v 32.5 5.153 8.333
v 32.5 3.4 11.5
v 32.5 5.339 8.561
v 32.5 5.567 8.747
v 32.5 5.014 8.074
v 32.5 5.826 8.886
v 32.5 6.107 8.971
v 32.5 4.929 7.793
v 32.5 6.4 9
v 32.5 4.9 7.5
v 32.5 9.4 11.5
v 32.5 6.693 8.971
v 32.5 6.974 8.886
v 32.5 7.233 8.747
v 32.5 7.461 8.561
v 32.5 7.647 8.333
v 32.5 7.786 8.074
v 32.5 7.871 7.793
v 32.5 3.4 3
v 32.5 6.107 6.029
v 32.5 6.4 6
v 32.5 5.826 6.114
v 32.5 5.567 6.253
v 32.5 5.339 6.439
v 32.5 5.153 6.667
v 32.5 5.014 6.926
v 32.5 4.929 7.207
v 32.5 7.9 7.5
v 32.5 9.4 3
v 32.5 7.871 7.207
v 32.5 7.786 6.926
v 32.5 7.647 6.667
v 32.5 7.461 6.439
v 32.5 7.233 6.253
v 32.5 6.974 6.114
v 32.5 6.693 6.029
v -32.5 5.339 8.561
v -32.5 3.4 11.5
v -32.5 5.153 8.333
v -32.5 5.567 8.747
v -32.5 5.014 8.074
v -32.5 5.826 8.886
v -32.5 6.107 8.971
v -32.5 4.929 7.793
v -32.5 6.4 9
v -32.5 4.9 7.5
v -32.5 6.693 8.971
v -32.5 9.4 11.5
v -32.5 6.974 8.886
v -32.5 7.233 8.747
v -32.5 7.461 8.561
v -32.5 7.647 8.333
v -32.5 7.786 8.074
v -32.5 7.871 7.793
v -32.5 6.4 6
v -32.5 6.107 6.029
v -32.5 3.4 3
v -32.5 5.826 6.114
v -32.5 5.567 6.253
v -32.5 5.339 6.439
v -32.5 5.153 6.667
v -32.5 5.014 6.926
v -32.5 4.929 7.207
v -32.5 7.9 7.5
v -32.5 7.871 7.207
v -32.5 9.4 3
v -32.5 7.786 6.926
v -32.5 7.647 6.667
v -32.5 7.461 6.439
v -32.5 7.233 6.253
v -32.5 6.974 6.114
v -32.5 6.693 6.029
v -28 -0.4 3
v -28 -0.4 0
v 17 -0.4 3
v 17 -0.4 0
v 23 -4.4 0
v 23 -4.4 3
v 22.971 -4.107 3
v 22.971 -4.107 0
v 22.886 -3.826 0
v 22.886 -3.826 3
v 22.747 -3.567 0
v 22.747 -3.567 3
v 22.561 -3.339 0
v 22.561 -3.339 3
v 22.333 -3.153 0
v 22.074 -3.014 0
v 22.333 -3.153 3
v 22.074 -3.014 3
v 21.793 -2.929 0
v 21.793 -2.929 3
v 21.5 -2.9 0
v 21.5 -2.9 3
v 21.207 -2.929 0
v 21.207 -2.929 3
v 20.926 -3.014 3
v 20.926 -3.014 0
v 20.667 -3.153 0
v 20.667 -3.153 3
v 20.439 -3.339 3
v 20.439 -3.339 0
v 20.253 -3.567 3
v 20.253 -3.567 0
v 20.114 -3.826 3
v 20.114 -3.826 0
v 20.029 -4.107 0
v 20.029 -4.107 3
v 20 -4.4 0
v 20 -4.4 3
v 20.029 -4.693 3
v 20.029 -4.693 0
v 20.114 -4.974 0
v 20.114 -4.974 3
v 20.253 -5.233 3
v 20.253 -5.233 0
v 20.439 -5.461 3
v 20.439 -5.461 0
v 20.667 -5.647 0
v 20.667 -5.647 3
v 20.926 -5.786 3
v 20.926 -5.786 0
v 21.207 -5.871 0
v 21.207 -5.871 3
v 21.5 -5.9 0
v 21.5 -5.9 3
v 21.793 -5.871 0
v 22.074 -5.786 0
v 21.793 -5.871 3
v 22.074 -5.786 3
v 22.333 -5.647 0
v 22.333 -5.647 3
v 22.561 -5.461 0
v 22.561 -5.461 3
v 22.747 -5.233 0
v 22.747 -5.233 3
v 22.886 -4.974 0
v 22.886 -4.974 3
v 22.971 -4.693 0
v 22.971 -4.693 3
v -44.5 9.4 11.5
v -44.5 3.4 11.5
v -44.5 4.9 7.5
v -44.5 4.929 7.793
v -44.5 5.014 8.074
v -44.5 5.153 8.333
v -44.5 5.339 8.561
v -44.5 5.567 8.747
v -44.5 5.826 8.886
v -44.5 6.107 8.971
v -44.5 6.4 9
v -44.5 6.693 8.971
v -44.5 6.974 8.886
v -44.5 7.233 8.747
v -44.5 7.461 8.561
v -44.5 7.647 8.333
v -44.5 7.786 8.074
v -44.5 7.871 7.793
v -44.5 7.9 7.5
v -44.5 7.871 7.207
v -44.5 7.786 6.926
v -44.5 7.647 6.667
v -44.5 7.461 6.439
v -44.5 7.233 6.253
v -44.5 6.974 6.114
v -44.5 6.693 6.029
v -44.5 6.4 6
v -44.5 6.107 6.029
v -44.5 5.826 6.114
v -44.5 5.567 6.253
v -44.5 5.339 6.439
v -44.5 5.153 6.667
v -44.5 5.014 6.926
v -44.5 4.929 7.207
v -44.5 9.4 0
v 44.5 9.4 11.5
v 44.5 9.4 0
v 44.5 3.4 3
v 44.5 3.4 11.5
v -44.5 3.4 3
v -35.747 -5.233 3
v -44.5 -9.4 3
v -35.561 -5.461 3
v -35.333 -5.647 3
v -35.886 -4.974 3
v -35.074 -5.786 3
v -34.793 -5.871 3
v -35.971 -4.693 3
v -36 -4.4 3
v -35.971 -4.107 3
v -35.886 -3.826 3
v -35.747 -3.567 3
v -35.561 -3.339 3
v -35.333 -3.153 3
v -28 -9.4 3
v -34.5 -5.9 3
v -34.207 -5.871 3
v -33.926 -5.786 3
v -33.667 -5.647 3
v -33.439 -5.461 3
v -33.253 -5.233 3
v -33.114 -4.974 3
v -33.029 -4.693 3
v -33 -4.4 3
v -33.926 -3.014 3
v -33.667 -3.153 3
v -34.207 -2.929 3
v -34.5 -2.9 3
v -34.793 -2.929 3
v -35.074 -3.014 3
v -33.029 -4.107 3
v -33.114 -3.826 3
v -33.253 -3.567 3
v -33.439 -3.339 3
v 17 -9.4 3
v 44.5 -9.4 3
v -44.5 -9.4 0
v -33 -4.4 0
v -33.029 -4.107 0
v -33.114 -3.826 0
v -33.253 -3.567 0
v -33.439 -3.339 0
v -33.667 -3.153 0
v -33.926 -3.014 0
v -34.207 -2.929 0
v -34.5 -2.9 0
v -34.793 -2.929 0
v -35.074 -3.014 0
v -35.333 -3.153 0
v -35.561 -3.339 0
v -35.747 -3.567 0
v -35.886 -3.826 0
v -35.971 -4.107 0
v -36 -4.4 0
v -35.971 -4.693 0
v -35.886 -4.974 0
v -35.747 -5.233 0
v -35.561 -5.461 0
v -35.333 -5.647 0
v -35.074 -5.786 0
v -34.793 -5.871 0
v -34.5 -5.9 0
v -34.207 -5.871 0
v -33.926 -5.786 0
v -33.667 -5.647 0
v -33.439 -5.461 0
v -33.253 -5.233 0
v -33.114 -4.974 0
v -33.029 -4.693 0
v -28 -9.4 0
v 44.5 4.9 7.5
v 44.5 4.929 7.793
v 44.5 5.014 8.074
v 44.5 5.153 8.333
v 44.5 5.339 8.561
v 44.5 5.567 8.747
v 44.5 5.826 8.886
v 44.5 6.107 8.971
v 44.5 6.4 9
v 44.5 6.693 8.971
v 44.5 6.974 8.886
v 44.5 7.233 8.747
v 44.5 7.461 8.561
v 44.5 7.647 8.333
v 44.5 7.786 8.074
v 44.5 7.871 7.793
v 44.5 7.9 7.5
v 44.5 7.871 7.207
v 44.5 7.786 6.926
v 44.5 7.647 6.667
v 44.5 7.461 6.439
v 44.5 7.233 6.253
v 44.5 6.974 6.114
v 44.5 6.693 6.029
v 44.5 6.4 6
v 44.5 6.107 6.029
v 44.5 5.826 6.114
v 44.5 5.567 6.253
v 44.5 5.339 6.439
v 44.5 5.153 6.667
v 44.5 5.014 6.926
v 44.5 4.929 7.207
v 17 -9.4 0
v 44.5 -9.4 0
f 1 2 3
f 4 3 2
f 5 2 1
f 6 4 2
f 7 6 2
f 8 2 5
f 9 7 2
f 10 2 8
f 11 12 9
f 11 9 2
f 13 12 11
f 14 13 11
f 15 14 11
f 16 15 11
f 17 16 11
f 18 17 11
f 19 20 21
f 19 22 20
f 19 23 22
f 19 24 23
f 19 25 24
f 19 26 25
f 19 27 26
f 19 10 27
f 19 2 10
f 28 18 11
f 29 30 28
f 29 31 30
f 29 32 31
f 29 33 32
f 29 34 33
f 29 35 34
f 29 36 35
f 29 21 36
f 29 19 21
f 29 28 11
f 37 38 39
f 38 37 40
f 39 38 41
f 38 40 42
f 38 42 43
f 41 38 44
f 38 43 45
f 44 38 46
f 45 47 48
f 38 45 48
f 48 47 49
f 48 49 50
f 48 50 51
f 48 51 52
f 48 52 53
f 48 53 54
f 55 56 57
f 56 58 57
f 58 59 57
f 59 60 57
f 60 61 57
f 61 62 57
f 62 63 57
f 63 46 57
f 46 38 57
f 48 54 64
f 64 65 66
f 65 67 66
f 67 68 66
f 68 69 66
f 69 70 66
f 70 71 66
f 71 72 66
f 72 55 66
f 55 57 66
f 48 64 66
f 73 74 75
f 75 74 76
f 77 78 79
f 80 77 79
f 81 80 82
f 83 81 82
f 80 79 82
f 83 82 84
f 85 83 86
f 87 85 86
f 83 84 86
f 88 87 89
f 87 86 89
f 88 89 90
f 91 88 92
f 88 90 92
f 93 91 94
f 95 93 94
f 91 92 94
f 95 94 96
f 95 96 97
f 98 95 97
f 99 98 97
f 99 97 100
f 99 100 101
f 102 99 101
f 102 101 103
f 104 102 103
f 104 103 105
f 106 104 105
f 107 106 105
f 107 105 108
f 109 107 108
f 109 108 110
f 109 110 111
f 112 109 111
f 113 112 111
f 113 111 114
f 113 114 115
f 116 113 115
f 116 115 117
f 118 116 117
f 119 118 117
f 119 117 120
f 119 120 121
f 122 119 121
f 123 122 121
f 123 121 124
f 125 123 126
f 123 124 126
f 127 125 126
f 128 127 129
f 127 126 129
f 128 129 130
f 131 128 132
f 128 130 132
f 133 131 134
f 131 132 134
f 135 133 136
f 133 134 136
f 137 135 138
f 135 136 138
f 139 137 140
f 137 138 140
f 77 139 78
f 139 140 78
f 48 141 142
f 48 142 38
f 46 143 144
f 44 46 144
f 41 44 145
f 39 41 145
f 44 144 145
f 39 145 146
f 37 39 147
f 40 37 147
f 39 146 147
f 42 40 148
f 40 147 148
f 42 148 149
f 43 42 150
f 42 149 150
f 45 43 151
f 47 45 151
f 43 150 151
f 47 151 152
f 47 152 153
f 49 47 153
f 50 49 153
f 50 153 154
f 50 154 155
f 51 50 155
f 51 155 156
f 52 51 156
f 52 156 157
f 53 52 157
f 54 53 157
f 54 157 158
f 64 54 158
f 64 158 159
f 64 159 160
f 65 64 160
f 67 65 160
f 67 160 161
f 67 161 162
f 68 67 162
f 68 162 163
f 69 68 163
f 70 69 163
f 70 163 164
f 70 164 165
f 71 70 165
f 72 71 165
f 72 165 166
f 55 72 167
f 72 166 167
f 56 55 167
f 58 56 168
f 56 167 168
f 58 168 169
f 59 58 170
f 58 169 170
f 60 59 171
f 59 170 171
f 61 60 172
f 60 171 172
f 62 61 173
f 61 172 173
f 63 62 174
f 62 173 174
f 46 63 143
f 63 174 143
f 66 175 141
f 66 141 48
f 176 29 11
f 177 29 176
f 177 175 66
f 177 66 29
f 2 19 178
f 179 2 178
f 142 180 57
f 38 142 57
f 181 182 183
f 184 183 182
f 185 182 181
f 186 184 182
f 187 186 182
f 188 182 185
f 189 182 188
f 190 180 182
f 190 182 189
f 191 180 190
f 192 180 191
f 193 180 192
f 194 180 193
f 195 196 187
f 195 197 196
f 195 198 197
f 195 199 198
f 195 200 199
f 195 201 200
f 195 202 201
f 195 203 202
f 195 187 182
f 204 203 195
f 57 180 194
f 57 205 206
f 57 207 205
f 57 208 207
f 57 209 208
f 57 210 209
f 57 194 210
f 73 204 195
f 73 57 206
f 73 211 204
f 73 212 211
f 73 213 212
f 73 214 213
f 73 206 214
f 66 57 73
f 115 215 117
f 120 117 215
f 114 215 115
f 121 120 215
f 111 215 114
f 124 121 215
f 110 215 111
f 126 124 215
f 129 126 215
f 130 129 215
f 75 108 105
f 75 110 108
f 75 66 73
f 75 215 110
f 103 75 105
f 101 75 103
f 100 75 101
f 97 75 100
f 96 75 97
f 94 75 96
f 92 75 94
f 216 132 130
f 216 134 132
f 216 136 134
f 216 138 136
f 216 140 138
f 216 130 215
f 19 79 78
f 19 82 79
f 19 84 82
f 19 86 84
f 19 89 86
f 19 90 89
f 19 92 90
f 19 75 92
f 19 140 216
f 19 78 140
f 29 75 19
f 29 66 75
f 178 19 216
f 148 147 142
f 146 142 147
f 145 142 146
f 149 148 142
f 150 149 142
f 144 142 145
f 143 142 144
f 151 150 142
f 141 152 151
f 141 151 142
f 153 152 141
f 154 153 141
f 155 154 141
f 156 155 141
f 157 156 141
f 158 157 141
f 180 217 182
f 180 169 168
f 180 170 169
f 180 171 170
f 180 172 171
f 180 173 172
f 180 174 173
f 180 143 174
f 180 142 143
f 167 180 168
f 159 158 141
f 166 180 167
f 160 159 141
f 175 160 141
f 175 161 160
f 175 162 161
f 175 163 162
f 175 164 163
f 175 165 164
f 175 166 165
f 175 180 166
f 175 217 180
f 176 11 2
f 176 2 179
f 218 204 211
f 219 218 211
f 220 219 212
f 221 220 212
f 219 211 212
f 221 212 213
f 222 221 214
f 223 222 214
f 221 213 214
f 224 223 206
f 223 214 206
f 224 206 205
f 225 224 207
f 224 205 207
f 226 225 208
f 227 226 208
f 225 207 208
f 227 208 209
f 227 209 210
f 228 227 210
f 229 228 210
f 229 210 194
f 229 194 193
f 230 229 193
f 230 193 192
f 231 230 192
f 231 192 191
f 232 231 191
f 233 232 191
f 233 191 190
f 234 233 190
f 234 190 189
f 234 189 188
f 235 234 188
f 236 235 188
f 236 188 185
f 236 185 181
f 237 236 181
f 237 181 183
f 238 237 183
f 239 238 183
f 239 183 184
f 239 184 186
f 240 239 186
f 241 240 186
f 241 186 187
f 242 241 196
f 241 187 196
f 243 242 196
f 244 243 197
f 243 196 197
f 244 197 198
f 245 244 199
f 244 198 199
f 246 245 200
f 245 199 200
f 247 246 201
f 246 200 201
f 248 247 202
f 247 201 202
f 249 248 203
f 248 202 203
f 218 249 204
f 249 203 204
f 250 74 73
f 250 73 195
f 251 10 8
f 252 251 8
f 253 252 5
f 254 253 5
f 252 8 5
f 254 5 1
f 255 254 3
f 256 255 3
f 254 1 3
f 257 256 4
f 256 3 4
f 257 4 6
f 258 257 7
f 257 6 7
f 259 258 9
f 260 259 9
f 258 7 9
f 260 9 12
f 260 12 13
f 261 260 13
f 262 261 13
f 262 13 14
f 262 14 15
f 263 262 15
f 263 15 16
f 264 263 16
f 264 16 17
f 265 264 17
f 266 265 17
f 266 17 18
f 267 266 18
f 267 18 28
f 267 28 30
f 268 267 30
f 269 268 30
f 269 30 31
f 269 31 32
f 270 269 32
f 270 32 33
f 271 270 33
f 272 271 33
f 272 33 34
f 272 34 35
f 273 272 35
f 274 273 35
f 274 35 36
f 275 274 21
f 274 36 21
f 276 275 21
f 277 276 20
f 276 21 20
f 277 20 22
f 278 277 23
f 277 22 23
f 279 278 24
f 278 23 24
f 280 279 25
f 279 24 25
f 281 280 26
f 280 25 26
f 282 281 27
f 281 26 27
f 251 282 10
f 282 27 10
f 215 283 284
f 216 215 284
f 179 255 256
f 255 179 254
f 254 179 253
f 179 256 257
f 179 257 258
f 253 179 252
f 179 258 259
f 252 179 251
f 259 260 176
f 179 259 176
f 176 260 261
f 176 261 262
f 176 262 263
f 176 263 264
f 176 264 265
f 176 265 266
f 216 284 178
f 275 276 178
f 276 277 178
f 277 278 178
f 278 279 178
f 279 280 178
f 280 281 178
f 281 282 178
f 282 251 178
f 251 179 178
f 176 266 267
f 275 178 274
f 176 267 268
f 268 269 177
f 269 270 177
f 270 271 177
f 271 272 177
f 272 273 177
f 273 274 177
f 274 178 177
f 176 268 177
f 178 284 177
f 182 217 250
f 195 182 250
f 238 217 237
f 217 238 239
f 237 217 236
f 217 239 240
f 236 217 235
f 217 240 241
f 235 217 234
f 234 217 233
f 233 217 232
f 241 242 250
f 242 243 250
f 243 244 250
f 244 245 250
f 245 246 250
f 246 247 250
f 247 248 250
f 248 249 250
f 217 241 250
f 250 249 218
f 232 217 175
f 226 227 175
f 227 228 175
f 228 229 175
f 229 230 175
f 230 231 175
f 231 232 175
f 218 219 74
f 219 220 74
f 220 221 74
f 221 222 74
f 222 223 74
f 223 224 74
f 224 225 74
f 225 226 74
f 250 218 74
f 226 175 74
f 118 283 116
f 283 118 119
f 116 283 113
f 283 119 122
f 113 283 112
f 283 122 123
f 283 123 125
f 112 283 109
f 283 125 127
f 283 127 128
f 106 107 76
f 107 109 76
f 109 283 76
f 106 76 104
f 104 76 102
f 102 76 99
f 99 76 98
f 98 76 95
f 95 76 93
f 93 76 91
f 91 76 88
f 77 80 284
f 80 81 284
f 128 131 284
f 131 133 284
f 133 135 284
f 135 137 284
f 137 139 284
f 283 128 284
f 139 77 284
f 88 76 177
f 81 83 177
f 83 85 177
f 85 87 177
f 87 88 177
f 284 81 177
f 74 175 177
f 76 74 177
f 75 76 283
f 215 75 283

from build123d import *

# Parameters (mm, degrees)
F0_W      = 89
F0_H      = 18.8
F1_DEPTH  = 3
F2_W      = 12
F2_H      = 6
F3_W      = 12
F3_H      = 6
F4_DEPTH  = 8.5
F5_R      = 1.5
F6_DEPTH  = 89.001
F7_R      = 1.5
F8_R      = 1.5
F9_DEPTH  = 15
F10_W     = 45
F10_H     = 9
F11_DEPTH = 25


with BuildPart() as f1:
    # F0 (on Top) → F1 (new body)
    with BuildSketch(Plane.XY):
        Rectangle(F0_W, F0_H)
    extrude(amount=F1_DEPTH)

    # F2 (on face) + F3 (on face) → F4 (join)
    with BuildSketch(Plane.XY.offset(3)):
        with Locations((38.5, 6.4)):
            Rectangle(F2_W, F2_H)
    with BuildSketch(Plane.XY.offset(3)):
        with Locations((-38.5, 6.4)):
            Rectangle(F3_W, F3_H)
    extrude(amount=F4_DEPTH)

    # F5 (on face) → F6 (cut, through all)
    with BuildSketch(Plane(origin=(-44.5, 0, 0), x_dir=(0, -1, 0), z_dir=(-1, 0, 0))):
        with Locations((-6.4, 7.5)):
            Circle(F5_R)
    extrude(amount=-F6_DEPTH, mode=Mode.SUBTRACT)

    # F7 (on face) + F8 (on face) → F9 (cut)
    with BuildSketch(Plane.XY.offset(3)):
        with Locations((21.5, -4.4)):
            Circle(F7_R)
    with BuildSketch(Plane.XY.offset(3)):
        with Locations((-34.5, -4.4)):
            Circle(F8_R)
    extrude(amount=-F9_DEPTH, mode=Mode.SUBTRACT)

    # F10 (on face) → F11 (cut)
    with BuildSketch(Plane(origin=(0, 0, 0), x_dir=(1, 0, 0), z_dir=(0, 0, -1))):
        with Locations((-5.5, 4.9)):
            Rectangle(F10_W, F10_H)
    extrude(amount=-F11_DEPTH, mode=Mode.SUBTRACT)


solid = f1.part
